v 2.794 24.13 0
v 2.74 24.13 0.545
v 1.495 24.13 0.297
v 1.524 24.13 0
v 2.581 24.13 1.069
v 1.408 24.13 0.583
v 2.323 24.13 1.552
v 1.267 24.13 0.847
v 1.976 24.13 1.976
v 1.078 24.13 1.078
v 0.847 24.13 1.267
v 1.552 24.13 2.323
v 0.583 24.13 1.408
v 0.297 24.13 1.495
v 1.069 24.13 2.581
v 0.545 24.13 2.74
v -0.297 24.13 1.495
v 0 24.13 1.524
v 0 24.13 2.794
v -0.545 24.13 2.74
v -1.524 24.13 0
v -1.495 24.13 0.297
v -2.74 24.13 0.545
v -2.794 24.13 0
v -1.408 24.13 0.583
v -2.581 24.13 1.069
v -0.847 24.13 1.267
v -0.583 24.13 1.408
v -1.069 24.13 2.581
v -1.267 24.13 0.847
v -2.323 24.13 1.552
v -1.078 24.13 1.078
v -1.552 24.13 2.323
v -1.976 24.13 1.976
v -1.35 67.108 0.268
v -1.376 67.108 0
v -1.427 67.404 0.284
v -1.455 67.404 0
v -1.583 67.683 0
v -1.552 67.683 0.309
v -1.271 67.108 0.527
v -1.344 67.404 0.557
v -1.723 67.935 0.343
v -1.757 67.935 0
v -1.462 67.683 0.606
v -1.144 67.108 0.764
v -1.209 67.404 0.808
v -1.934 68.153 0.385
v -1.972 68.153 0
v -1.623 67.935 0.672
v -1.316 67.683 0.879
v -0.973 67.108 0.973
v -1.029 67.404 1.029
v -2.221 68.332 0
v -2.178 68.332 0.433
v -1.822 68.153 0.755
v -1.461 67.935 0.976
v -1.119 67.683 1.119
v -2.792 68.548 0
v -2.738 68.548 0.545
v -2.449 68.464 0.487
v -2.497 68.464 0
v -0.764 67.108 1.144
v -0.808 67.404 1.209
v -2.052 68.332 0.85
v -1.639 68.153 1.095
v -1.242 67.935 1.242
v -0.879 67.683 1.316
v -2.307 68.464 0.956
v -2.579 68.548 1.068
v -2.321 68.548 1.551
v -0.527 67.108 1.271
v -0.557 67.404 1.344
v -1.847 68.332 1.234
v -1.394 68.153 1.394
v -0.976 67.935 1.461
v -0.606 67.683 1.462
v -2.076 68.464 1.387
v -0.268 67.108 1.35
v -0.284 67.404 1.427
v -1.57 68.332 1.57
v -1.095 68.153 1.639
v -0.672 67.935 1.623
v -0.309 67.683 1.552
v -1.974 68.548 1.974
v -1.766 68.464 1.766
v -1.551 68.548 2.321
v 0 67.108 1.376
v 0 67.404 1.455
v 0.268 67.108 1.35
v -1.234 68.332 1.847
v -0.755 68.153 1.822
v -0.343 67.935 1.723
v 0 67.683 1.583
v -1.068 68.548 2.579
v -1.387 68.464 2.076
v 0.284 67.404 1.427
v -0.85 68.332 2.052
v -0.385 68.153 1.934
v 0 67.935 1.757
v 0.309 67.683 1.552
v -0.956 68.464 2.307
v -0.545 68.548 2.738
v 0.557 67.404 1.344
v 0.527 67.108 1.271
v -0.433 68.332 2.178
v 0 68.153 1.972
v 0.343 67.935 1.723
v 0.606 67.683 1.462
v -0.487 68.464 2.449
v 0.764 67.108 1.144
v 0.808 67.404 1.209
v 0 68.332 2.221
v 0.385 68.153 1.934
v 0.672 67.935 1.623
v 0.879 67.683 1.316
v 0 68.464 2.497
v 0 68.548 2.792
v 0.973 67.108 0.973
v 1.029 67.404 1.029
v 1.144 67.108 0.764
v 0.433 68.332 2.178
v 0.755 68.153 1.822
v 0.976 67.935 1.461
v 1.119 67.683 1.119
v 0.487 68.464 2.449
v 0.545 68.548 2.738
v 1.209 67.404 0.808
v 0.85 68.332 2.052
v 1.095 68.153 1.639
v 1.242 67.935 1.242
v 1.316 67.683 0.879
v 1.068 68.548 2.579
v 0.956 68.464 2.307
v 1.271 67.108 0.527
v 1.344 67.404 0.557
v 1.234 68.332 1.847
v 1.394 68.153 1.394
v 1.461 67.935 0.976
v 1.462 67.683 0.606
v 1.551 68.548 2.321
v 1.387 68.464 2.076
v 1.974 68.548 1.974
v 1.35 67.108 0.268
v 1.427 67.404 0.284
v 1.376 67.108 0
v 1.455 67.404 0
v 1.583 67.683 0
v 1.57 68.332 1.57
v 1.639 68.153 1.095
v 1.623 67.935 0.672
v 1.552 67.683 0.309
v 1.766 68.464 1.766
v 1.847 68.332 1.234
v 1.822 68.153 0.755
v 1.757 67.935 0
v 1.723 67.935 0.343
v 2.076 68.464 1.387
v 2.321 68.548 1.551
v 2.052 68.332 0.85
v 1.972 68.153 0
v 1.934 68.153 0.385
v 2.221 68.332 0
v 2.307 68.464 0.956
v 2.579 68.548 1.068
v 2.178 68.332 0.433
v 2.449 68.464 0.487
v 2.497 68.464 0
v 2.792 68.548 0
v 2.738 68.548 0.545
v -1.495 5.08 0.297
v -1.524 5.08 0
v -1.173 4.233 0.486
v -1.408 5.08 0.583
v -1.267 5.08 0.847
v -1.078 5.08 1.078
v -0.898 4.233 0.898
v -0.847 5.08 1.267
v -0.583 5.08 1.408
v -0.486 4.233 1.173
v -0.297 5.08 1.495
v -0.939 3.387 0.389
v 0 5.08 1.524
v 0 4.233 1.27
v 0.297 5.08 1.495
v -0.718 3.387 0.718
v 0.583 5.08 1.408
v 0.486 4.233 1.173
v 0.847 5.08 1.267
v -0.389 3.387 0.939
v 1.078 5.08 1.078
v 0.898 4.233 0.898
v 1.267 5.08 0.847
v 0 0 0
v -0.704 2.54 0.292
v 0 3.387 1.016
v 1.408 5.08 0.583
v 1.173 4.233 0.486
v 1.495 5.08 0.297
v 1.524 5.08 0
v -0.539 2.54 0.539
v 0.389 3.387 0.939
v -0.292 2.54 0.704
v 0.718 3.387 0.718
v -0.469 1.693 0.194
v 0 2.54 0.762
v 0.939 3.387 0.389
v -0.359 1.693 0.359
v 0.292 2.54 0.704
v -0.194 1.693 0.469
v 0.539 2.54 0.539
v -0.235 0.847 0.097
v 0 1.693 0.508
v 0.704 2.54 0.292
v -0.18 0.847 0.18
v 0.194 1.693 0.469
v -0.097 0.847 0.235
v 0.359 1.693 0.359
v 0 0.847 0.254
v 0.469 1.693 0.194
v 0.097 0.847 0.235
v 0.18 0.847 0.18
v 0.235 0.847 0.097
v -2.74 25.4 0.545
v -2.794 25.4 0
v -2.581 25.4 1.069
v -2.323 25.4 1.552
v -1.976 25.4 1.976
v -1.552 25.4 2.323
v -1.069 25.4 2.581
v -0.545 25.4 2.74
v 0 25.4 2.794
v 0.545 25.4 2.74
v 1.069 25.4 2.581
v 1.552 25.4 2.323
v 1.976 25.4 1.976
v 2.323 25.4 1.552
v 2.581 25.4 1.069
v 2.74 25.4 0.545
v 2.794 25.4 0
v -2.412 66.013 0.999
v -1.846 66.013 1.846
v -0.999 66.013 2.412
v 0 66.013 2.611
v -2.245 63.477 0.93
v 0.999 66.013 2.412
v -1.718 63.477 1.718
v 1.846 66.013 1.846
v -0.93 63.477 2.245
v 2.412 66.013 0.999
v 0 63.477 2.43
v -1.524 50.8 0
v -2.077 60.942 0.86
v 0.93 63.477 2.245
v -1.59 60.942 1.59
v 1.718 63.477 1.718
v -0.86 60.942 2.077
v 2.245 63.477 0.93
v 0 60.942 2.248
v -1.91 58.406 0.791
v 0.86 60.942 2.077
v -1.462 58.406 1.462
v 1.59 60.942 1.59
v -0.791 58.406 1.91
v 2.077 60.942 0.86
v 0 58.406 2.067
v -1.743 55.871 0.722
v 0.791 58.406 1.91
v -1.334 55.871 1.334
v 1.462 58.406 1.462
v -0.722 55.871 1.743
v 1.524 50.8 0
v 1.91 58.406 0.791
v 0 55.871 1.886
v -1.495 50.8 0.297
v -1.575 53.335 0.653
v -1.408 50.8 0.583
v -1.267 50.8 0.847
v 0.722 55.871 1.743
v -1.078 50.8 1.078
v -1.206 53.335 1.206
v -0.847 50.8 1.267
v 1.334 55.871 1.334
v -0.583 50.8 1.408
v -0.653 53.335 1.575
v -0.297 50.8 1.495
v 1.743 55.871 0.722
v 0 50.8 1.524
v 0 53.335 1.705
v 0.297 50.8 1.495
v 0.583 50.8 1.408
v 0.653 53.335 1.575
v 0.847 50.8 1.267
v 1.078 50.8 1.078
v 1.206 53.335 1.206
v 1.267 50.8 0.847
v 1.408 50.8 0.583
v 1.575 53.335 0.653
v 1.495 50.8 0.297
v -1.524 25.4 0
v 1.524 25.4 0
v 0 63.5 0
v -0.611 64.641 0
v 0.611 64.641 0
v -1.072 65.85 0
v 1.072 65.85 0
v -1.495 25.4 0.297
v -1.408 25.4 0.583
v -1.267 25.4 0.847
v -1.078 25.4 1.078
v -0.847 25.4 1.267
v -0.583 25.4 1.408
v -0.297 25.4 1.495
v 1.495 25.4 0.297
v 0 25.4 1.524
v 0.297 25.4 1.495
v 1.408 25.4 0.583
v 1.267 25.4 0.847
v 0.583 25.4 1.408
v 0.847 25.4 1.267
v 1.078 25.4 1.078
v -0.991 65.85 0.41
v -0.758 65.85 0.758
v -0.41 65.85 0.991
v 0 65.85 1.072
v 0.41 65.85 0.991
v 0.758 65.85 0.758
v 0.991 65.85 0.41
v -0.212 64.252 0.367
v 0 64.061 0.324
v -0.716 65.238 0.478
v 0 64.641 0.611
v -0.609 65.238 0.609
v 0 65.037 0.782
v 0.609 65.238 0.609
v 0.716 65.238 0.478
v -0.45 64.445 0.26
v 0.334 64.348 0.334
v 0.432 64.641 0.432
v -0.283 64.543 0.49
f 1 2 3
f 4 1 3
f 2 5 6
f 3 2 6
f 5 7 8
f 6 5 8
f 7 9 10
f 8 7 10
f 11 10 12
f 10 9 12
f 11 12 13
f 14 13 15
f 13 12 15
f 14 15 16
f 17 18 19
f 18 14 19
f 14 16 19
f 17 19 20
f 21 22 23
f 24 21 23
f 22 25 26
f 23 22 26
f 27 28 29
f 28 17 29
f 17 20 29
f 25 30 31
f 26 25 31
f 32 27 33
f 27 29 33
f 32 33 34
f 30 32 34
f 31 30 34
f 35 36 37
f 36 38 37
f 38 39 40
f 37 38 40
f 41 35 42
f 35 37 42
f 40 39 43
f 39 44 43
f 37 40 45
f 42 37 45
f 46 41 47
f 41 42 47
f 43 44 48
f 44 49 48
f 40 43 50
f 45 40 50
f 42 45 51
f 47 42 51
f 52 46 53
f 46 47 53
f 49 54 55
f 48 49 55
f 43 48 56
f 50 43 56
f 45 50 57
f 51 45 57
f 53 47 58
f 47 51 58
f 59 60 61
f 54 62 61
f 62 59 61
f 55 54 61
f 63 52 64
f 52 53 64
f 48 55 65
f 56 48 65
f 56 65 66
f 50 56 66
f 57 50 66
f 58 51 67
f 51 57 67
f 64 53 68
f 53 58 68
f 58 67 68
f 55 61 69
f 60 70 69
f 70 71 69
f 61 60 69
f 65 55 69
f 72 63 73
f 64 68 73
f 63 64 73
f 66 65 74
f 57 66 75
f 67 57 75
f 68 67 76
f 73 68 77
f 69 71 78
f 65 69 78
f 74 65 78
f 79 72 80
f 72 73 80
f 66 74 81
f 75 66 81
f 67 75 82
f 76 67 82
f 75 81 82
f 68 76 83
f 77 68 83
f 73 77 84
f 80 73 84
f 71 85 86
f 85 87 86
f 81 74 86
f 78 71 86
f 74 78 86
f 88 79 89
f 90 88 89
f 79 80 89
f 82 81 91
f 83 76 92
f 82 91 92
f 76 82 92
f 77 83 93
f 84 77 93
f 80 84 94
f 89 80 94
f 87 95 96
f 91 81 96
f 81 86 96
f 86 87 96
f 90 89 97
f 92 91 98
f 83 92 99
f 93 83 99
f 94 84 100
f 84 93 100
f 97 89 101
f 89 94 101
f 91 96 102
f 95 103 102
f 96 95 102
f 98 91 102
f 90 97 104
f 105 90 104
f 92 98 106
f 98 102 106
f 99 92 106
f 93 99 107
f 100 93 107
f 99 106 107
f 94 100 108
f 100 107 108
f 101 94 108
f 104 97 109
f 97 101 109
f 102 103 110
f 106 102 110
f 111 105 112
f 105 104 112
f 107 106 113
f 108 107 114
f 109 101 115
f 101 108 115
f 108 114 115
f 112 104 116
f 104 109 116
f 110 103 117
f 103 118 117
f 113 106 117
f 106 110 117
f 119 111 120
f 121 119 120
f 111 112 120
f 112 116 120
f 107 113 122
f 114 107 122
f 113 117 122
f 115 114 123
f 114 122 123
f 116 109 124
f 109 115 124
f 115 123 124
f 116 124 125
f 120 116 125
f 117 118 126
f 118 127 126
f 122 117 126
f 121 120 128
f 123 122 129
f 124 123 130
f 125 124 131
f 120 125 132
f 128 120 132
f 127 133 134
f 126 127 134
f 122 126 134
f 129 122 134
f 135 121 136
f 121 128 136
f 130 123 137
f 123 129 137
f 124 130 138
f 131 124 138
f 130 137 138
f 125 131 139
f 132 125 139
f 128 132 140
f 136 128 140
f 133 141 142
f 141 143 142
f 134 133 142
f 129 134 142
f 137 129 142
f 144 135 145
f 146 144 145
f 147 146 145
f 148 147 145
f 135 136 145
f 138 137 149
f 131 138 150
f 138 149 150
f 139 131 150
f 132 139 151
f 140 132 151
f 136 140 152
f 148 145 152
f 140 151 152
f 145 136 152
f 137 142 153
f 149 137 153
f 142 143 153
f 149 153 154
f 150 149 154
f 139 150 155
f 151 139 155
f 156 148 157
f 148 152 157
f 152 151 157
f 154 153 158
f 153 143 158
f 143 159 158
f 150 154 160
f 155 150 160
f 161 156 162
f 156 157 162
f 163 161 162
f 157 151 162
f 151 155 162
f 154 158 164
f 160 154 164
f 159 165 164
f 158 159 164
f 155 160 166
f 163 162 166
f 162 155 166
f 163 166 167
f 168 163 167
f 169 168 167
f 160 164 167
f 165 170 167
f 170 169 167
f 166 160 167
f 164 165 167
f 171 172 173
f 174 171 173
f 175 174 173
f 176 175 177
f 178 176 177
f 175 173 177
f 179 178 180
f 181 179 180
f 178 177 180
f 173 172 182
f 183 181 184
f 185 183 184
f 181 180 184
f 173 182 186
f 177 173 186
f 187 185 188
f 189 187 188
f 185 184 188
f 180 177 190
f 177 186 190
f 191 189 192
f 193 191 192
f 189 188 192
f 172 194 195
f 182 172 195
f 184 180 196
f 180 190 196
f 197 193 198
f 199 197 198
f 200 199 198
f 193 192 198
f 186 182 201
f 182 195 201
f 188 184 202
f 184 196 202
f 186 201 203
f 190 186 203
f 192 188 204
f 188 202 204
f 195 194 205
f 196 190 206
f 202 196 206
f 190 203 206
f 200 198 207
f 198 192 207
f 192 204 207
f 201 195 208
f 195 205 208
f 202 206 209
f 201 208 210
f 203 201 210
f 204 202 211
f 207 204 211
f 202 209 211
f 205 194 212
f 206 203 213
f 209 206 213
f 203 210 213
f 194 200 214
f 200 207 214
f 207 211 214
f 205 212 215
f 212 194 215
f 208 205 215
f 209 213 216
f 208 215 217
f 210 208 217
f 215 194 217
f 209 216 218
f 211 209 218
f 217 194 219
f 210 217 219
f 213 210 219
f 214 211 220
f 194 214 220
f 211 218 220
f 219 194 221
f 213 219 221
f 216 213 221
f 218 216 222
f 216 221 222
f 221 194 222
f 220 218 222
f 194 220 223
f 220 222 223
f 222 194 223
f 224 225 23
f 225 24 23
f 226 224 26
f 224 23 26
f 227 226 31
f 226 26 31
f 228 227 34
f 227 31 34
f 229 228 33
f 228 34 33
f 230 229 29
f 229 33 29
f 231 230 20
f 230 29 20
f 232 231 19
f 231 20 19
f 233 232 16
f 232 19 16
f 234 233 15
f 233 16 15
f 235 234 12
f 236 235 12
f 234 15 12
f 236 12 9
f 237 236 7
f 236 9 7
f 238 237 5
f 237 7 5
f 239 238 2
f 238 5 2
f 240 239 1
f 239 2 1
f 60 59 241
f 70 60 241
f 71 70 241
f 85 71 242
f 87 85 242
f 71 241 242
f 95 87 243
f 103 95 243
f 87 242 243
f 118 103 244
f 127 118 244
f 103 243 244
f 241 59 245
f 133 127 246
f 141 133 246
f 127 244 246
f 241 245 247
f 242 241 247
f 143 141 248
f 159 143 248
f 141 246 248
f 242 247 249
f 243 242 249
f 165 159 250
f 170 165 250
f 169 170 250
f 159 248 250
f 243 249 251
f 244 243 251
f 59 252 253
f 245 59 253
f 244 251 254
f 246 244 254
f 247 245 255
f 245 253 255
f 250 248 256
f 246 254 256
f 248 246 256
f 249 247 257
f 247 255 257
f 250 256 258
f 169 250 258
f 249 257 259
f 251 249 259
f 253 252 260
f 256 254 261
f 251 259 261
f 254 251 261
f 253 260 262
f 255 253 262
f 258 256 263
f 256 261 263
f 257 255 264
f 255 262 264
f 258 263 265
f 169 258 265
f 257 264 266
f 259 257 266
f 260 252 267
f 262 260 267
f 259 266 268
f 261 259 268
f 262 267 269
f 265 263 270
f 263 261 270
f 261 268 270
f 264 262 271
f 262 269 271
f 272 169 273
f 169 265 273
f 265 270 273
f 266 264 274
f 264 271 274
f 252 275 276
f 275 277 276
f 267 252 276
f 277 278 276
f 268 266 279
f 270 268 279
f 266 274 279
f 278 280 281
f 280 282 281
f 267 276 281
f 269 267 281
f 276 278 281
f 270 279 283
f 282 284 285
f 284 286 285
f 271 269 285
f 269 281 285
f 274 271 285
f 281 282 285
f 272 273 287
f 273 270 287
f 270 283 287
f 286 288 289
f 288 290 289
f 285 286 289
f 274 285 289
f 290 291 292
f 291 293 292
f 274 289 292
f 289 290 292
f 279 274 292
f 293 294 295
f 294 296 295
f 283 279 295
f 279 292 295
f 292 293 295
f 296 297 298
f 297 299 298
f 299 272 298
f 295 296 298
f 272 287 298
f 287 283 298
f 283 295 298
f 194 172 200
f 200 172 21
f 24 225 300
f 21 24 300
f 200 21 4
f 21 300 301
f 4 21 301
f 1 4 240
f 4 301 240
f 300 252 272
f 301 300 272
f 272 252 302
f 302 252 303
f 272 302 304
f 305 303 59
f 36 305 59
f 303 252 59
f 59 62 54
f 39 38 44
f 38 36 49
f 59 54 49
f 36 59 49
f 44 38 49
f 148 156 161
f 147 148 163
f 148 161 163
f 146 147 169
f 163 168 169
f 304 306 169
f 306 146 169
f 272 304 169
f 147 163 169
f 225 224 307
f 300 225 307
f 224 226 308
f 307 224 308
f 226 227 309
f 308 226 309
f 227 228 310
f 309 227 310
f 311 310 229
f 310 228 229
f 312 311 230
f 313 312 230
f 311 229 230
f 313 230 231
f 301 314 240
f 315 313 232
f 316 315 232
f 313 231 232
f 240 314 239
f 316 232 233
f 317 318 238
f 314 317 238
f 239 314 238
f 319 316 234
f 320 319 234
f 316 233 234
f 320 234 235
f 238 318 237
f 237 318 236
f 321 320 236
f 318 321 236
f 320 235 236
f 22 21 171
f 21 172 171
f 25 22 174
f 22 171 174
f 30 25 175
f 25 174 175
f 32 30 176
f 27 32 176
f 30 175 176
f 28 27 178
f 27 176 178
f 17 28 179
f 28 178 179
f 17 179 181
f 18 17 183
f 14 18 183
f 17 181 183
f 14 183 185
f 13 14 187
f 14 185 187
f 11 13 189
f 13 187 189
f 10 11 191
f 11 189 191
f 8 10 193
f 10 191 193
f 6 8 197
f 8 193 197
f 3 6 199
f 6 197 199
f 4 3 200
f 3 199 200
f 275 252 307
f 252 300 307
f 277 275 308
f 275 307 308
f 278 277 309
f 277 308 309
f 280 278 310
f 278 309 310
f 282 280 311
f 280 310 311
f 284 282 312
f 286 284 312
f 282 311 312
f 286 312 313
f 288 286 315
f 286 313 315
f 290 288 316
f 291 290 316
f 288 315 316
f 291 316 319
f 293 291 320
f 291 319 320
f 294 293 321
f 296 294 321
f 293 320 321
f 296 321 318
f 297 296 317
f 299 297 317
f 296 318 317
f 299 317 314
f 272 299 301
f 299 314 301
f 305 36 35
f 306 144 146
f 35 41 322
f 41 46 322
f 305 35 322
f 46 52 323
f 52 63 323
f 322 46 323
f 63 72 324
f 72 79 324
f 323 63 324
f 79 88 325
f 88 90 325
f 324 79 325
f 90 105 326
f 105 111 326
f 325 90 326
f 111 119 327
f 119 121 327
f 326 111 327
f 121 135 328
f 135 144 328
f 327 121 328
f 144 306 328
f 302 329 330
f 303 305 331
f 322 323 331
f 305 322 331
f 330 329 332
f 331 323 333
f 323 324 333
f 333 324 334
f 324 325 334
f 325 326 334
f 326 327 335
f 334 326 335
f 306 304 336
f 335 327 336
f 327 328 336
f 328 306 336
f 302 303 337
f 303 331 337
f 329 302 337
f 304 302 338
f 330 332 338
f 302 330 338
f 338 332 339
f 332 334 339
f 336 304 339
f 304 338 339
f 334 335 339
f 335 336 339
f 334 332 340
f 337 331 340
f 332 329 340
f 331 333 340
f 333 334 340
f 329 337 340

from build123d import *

# Parameters (mm, degrees)
F1_ANGLE = 180


with BuildPart() as f1:
    # F0 (on Top) → F1 (revolve)
    with BuildSketch(Plane.XY):
        with BuildLine():
            Line((-1.524, 5.08), (0, 0))
            Line((0, 0), (0, 63.5))
            ThreePointArc((0, 63.5), (-0.860989, 65.238151), (-1.375962, 67.108251))
            ThreePointArc((-1.375962, 67.108251), (-1.859621, 68.048616), (-2.791716, 68.548026))
            Line((-2.791716, 68.548026), (-1.524, 50.8))
            Line((-1.524, 50.8), (-1.524, 25.4))
            Line((-1.524, 25.4), (-2.794, 25.4))
            Line((-2.794, 25.4), (-2.794, 24.13))
            Line((-2.794, 24.13), (-1.524, 24.13))
            Line((-1.524, 24.13), (-1.524, 5.08))
        make_face()
    revolve(axis=Axis((0, 31.75, 0), (0, 1, 0)), revolution_arc=F1_ANGLE)


solid = f1.part
